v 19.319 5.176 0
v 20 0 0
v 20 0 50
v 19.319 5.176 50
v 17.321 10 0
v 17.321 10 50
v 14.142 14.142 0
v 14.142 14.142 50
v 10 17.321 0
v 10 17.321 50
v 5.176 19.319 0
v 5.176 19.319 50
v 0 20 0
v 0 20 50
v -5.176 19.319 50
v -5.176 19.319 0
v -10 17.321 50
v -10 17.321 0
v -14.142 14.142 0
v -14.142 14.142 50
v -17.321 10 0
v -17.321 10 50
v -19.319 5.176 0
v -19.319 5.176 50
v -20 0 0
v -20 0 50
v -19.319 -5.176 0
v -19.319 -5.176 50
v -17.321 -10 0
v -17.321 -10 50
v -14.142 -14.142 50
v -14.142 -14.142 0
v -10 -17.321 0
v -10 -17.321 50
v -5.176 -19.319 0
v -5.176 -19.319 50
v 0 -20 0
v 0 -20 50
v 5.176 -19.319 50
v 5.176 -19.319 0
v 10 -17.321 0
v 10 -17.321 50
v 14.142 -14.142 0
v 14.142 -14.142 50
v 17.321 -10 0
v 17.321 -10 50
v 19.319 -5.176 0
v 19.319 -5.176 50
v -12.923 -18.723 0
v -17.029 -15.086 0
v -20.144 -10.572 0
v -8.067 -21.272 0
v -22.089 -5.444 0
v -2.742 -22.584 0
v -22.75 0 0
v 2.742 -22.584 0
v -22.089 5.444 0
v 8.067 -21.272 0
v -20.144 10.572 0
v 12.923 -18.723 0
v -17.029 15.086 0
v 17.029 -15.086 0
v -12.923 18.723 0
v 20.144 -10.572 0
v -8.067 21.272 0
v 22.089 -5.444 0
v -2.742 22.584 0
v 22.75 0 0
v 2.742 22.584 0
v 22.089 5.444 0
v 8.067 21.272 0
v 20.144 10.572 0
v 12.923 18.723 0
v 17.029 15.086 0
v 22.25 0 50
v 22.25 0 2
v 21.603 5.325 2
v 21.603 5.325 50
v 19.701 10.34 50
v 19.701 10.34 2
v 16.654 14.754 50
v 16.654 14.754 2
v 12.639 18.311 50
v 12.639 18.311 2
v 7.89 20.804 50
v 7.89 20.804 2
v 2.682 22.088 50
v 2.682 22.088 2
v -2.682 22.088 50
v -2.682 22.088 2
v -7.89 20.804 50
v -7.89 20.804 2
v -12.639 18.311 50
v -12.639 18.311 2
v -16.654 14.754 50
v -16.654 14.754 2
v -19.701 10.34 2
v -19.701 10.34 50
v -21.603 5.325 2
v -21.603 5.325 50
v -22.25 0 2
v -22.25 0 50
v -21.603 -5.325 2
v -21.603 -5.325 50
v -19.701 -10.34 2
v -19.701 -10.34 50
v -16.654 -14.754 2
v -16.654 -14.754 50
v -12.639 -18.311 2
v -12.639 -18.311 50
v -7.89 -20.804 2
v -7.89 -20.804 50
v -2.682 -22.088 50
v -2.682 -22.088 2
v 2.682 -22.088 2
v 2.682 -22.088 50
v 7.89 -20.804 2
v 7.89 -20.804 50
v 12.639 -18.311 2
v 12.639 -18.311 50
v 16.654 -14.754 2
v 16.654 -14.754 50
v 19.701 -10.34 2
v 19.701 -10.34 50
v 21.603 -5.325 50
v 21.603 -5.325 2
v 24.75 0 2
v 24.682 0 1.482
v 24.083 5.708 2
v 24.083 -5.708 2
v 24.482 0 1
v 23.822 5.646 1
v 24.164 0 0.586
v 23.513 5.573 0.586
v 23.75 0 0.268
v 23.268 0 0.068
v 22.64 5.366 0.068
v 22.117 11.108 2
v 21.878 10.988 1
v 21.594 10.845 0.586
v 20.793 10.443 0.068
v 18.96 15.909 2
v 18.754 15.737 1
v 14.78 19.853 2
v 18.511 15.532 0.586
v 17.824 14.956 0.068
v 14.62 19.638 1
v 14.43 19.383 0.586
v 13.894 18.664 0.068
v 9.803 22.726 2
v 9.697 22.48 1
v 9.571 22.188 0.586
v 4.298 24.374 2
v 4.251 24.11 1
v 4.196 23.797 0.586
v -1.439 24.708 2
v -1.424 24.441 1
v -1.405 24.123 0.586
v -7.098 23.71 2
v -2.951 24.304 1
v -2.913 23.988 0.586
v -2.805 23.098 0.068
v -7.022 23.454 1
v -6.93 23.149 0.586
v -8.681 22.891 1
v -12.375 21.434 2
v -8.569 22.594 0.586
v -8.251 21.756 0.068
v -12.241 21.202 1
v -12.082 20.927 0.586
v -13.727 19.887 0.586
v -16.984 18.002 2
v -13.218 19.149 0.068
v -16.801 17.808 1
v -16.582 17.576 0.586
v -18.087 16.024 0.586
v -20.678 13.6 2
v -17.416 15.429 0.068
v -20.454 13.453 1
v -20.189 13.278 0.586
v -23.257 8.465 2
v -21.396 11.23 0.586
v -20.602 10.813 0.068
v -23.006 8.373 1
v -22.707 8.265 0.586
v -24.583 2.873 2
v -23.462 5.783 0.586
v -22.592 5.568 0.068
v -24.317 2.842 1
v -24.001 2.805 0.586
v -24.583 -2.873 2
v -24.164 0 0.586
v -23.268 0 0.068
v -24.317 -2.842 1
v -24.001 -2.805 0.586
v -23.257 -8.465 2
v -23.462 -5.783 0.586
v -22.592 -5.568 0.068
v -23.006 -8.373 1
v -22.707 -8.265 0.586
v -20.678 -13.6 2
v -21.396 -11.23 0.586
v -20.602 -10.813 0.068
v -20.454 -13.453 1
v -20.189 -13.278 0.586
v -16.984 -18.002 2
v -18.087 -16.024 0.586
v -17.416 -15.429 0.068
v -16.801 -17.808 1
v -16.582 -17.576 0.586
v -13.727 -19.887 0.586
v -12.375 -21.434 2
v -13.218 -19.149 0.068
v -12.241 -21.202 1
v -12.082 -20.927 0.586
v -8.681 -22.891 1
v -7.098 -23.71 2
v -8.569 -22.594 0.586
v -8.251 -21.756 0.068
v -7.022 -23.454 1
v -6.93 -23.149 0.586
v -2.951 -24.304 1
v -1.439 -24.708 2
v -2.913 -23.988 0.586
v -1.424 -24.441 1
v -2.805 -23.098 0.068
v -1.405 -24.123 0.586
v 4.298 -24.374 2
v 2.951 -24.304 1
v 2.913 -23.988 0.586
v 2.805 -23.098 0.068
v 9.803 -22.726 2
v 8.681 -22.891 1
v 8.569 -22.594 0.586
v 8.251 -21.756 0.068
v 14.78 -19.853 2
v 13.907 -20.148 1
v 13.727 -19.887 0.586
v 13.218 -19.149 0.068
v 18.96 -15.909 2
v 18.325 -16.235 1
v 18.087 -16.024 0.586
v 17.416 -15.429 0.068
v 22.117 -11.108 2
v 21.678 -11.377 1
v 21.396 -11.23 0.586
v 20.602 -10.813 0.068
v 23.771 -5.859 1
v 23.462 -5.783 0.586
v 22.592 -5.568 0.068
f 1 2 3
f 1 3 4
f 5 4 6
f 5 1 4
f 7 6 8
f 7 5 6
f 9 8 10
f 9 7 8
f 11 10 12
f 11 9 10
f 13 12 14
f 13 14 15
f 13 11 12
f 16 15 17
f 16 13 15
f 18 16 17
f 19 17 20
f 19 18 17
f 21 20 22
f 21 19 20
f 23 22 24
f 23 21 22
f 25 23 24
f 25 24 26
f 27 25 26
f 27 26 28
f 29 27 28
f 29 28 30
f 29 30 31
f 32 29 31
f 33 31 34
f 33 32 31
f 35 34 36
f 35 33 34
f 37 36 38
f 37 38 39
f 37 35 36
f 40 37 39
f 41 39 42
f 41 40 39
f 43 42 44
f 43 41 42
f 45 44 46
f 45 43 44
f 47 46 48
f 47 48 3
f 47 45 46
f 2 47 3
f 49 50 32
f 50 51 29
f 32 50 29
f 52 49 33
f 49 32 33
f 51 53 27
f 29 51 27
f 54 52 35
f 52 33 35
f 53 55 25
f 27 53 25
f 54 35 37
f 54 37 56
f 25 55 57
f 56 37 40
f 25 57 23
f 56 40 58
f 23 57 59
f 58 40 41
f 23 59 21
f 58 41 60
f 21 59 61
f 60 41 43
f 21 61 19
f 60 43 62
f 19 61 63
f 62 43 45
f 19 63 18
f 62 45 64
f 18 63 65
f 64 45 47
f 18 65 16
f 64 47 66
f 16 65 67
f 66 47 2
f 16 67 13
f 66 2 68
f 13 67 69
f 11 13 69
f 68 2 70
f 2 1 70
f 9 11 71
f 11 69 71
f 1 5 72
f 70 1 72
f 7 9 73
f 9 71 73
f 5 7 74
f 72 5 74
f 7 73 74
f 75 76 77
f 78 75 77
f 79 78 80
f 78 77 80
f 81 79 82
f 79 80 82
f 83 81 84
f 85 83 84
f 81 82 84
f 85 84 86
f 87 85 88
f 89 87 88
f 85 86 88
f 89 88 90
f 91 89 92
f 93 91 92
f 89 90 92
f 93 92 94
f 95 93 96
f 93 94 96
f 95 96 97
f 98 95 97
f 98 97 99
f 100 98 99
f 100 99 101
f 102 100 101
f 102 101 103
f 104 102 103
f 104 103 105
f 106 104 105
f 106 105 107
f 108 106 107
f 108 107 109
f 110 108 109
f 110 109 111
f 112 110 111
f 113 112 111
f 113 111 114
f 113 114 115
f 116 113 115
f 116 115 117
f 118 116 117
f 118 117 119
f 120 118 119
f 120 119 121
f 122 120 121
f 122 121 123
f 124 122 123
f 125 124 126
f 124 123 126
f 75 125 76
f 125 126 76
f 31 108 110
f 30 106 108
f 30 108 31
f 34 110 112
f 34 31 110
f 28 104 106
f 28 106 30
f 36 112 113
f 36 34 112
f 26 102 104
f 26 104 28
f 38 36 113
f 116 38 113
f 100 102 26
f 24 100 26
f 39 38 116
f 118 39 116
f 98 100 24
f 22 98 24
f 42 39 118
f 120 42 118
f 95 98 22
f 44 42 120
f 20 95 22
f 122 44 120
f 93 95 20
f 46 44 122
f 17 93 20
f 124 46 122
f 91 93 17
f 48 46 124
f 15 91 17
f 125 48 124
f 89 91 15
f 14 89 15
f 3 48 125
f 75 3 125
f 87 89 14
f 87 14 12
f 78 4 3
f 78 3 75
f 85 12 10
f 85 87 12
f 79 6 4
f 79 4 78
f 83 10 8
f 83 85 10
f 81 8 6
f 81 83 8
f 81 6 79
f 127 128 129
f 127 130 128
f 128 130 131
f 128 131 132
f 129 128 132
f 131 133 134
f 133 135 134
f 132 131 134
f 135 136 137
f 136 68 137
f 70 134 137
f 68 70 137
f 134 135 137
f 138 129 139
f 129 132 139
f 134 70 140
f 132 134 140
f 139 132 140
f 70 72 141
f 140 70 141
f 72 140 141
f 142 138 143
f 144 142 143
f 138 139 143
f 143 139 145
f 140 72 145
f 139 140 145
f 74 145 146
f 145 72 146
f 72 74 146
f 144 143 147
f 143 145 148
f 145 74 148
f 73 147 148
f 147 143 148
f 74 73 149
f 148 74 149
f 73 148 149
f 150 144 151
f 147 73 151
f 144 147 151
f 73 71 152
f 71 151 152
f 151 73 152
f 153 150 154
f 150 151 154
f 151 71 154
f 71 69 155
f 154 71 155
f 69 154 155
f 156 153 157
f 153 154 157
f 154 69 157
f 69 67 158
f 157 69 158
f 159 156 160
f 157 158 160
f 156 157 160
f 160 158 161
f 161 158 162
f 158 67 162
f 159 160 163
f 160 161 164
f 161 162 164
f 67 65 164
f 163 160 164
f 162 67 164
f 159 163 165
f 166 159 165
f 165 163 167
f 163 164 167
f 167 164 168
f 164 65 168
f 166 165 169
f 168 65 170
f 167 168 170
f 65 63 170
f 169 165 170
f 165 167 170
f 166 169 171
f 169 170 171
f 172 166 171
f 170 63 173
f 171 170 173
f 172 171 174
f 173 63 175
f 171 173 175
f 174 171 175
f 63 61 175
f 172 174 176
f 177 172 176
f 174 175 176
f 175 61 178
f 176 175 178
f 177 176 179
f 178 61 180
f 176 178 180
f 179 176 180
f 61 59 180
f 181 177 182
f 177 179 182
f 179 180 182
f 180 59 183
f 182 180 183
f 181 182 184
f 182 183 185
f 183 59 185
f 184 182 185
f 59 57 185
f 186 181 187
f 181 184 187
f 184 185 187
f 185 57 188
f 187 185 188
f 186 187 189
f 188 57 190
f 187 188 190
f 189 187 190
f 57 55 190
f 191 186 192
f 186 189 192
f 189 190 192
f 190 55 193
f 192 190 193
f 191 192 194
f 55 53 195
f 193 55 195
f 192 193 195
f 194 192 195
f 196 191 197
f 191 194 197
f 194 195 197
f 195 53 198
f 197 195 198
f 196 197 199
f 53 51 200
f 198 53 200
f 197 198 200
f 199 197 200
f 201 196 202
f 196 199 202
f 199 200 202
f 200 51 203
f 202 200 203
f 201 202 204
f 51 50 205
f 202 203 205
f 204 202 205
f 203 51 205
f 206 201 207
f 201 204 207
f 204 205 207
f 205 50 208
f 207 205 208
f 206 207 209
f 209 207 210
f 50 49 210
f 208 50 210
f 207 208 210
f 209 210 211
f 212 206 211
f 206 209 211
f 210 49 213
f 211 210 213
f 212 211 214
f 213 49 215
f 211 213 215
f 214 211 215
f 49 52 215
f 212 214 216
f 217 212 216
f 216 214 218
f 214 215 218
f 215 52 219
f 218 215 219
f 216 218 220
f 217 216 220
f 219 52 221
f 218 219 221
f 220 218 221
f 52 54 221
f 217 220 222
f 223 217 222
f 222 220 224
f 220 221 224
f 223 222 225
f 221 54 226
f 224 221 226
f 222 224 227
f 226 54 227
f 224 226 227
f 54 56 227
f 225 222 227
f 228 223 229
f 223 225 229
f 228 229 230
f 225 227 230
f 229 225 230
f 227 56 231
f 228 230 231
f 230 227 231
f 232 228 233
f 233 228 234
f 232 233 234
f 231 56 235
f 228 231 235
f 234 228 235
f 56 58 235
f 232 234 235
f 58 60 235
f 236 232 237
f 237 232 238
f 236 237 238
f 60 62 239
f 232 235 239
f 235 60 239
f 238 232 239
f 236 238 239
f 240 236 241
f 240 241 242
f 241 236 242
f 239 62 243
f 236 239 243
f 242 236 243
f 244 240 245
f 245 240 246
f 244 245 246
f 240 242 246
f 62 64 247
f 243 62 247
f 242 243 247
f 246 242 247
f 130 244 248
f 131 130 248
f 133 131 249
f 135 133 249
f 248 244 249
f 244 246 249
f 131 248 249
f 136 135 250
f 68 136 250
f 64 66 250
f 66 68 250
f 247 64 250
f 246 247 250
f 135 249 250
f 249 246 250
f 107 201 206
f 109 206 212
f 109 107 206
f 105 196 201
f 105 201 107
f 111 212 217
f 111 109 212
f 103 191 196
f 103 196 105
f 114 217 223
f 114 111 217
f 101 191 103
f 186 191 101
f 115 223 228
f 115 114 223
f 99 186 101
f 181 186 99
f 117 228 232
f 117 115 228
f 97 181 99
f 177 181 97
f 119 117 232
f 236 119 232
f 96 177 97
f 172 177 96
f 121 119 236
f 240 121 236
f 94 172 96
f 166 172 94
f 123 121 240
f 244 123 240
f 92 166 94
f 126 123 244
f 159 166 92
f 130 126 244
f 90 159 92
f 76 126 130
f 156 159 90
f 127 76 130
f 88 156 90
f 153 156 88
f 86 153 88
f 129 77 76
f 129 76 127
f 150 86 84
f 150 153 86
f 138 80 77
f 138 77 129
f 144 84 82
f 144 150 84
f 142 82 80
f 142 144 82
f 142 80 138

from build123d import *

# Parameters (mm, degrees)
F0_R     = 22.25
F0_R_2   = 20
F1_DEPTH = 50
F0_R_3   = 24.75
F2_DEPTH = 2
F3_R     = 1.99999


# Not quite as in the source:
# - a fillet or chamfer is up to 0.001 mm smaller than in the source, because OpenCascade refuses the exact size


with BuildPart() as f1:
    # F0 (on Top) → F1 (new body)
    with BuildSketch(Plane.XY):
        Circle(F0_R)
        Circle(F0_R_2, mode=Mode.SUBTRACT)
    extrude(amount=F1_DEPTH)

    # F0 (on Top) → F2 (join)
    with BuildSketch(Plane.XY):
        Circle(F0_R_3)
        Circle(F0_R, mode=Mode.SUBTRACT)
    extrude(amount=F2_DEPTH)

    # F3 (radius 2 in the source; OpenCascade refuses exactly that, so slightly less here)
    f3_edges = [f1.edges().sort_by_distance(p)[0] for p in [
        (-24.75, 0, 0),
    ]]
    fillet(f3_edges, radius=F3_R)


solid = f1.part
